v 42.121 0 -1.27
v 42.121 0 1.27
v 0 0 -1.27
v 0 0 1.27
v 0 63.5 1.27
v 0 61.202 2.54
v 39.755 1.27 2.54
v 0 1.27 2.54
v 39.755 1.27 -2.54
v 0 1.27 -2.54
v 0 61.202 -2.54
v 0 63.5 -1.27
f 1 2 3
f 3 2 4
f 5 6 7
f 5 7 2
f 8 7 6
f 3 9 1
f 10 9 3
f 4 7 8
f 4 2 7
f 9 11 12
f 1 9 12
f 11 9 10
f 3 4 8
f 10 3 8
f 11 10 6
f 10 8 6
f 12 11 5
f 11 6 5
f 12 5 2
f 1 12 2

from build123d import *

# Parameters (mm, degrees)
EXTRUDE1_DEPTH = 2.54
CHAMFER1_SIZE  = 1.27


with BuildPart() as part:
    # Sketch1 → Extrude1 (new body, symmetric)
    with BuildSketch(Plane.XY):
        Polygon((0, 63.5), (42.121134838, 0), (0, 0), align=None)
    extrude(amount=EXTRUDE1_DEPTH, both=True)

    # Chamfer1
    chamfer1_edges = [part.edges().sort_by_distance(p)[0] for p in [
        (21.060567419, 31.75, 2.54),
        (21.060567419, 31.75, -2.54),
        (21.060567419, 0, -2.54),
        (21.060567419, 0, 2.54),
    ]]
    chamfer(chamfer1_edges, length=CHAMFER1_SIZE)


solid = part.part
